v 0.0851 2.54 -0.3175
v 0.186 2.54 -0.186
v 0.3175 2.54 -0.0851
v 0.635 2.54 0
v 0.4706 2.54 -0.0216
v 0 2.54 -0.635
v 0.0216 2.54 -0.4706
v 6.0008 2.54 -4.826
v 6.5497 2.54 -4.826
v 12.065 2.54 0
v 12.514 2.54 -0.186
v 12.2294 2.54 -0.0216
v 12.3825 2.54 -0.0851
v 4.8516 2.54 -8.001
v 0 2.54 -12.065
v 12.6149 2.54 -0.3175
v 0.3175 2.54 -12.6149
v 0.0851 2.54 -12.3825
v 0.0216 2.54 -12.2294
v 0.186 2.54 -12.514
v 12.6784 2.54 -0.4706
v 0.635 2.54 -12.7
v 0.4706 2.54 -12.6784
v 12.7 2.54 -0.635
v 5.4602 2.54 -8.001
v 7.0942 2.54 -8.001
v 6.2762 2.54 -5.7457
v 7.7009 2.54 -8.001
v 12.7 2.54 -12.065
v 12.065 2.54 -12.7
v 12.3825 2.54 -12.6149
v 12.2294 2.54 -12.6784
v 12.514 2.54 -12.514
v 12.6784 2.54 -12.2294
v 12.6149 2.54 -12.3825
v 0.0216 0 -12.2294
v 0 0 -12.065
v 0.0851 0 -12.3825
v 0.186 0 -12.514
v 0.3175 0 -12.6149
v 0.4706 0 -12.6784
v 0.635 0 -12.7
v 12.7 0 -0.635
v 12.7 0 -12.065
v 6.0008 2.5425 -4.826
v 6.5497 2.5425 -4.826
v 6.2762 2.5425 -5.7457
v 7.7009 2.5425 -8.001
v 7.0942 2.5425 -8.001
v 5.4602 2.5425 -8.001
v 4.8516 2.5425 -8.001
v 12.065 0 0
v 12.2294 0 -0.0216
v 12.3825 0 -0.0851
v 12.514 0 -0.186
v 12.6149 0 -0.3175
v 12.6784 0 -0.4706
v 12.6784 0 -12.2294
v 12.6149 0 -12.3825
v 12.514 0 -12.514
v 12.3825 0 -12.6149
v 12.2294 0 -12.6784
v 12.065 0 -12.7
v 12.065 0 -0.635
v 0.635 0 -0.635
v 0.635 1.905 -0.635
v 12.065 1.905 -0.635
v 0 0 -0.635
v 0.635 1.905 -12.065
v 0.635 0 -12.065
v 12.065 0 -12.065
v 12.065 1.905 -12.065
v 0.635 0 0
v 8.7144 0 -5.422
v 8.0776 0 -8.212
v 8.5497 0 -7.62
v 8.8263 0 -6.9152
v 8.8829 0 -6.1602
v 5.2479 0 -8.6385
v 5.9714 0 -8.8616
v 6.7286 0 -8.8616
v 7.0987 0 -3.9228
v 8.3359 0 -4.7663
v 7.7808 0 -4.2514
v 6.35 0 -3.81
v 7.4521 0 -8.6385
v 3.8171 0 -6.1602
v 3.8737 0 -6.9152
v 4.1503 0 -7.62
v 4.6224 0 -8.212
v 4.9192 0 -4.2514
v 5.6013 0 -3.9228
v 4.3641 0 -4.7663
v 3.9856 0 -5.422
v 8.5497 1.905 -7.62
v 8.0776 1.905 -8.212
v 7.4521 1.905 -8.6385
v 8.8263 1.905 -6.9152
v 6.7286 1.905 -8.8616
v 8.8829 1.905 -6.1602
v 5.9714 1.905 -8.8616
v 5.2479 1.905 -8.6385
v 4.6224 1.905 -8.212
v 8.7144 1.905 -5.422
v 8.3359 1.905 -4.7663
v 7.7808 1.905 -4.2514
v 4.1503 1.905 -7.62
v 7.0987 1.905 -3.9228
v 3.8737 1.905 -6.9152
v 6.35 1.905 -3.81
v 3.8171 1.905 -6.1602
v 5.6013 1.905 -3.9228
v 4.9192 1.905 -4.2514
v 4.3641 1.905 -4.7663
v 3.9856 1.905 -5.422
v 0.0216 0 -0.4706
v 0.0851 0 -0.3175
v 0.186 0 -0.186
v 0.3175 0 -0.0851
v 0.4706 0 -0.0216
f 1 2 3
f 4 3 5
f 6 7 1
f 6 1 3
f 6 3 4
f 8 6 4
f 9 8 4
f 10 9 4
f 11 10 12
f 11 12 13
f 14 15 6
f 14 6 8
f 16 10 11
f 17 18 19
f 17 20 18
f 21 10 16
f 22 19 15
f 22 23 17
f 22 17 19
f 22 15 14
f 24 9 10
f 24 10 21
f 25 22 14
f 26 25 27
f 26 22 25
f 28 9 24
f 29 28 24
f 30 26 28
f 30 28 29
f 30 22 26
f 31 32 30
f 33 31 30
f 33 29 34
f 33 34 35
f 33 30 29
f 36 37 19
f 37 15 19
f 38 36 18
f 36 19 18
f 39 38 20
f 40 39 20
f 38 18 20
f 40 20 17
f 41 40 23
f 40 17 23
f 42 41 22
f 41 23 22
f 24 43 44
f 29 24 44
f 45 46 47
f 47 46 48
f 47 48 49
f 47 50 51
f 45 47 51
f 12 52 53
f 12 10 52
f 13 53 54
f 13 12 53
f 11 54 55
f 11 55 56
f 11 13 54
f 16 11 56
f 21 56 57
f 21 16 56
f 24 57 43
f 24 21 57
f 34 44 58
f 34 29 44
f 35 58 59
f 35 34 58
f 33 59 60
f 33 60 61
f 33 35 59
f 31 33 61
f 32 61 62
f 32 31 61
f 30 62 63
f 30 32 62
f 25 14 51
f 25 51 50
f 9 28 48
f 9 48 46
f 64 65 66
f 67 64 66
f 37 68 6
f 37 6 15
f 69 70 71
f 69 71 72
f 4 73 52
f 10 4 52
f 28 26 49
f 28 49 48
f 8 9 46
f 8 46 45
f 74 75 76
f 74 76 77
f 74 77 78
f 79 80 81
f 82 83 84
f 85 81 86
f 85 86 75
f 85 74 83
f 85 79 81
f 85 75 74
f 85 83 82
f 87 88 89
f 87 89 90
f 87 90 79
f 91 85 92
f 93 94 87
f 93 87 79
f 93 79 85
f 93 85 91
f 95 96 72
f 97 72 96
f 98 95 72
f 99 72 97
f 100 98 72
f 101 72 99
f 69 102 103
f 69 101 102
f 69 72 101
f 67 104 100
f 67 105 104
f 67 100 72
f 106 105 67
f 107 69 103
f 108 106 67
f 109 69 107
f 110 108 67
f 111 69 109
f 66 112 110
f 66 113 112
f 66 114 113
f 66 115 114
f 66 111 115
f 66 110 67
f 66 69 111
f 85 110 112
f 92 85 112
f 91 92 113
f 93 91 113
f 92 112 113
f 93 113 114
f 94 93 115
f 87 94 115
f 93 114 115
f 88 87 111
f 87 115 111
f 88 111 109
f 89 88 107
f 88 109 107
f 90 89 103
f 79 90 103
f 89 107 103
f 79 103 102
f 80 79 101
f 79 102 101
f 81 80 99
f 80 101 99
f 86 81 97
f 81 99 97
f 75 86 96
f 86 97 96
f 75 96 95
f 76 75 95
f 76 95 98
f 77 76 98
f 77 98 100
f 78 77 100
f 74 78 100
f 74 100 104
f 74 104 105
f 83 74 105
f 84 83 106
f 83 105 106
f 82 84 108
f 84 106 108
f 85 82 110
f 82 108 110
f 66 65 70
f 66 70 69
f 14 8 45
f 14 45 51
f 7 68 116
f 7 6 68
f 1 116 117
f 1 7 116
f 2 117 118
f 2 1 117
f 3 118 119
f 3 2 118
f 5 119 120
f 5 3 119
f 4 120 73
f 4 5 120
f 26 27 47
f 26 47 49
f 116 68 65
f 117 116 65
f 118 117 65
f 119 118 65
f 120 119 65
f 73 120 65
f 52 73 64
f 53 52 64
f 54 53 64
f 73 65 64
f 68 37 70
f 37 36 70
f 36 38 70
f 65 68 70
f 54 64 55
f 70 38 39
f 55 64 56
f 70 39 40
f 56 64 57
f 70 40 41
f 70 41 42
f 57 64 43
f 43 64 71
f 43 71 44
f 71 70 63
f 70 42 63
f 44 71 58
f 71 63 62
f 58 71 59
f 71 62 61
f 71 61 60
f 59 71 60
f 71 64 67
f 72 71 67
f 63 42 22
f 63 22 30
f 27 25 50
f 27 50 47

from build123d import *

# Parameters (mm, degrees)
SKETCH1_W           = 12.7
SKETCH1_H           = 12.7
BOSS_EXTRUDE1_DEPTH = 2.54
FILLET1_R           = 0.635
SHELL1_START        = 0.635
SHELL1_OUTLINE_W    = 1.905
SHELL1_OUTLINE_H    = 11.43
SHELL1_DEPTH        = 11.43
SKETCH2_R           = 2.54
BOSS_EXTRUDE2_DEPTH = 1.905
BOSS_EXTRUDE3_DEPTH = 0.00254


# Read off the part's stored shape, not the designer's step: Shell1
with BuildPart() as part:
    # Sketch1 → Boss-Extrude1 (new body)
    with BuildSketch(Plane(origin=(0, 0, 0), x_dir=(1, 0, 0), z_dir=(0, 1, 0))):
        with Locations((6.35, 6.35)):
            Rectangle(SKETCH1_W, SKETCH1_H)
    extrude(amount=BOSS_EXTRUDE1_DEPTH)

    # Fillet1
    fillet1_edges = [part.edges().sort_by_distance(p)[0] for p in [
        (0, 1.27, -12.7),
        (12.7, 1.27, -12.7),
        (12.7, 1.27, 0),
        (0, 1.27, 0),
    ]]
    fillet(fillet1_edges, radius=FILLET1_R)

    # Shell1 outline → Shell1 (cut)
    with BuildSketch(Plane.YZ.offset(SHELL1_START)):
        with Locations((0.9525, -6.35)):
            Rectangle(SHELL1_OUTLINE_W, SHELL1_OUTLINE_H)
    extrude(amount=SHELL1_DEPTH, mode=Mode.SUBTRACT)

    # Sketch2 → Boss-Extrude2 (add)
    with BuildSketch(Plane(origin=(0, 1.905, 0), x_dir=(-1, 0, 0), z_dir=(0, -1, 0))):
        with Locations(Location((-6.35, 6.35, 0), (0, 0, 270))):
            Circle(SKETCH2_R)
    extrude(amount=BOSS_EXTRUDE2_DEPTH)

    # Sketch3 → Boss-Extrude3 (add)
    with BuildSketch(Plane(origin=(0, 2.54, 0), x_dir=(1, 0, 0), z_dir=(0, 1, 0))):
        Polygon((4.851562821, 8.001), (5.460231691, 8.001), (6.276242308, 5.74568149), (7.094160978, 8.001), (7.700921795, 8.001), (6.549729888, 4.826), (6.000846675, 4.826), align=None)
    extrude(amount=BOSS_EXTRUDE3_DEPTH)


solid = part.part
